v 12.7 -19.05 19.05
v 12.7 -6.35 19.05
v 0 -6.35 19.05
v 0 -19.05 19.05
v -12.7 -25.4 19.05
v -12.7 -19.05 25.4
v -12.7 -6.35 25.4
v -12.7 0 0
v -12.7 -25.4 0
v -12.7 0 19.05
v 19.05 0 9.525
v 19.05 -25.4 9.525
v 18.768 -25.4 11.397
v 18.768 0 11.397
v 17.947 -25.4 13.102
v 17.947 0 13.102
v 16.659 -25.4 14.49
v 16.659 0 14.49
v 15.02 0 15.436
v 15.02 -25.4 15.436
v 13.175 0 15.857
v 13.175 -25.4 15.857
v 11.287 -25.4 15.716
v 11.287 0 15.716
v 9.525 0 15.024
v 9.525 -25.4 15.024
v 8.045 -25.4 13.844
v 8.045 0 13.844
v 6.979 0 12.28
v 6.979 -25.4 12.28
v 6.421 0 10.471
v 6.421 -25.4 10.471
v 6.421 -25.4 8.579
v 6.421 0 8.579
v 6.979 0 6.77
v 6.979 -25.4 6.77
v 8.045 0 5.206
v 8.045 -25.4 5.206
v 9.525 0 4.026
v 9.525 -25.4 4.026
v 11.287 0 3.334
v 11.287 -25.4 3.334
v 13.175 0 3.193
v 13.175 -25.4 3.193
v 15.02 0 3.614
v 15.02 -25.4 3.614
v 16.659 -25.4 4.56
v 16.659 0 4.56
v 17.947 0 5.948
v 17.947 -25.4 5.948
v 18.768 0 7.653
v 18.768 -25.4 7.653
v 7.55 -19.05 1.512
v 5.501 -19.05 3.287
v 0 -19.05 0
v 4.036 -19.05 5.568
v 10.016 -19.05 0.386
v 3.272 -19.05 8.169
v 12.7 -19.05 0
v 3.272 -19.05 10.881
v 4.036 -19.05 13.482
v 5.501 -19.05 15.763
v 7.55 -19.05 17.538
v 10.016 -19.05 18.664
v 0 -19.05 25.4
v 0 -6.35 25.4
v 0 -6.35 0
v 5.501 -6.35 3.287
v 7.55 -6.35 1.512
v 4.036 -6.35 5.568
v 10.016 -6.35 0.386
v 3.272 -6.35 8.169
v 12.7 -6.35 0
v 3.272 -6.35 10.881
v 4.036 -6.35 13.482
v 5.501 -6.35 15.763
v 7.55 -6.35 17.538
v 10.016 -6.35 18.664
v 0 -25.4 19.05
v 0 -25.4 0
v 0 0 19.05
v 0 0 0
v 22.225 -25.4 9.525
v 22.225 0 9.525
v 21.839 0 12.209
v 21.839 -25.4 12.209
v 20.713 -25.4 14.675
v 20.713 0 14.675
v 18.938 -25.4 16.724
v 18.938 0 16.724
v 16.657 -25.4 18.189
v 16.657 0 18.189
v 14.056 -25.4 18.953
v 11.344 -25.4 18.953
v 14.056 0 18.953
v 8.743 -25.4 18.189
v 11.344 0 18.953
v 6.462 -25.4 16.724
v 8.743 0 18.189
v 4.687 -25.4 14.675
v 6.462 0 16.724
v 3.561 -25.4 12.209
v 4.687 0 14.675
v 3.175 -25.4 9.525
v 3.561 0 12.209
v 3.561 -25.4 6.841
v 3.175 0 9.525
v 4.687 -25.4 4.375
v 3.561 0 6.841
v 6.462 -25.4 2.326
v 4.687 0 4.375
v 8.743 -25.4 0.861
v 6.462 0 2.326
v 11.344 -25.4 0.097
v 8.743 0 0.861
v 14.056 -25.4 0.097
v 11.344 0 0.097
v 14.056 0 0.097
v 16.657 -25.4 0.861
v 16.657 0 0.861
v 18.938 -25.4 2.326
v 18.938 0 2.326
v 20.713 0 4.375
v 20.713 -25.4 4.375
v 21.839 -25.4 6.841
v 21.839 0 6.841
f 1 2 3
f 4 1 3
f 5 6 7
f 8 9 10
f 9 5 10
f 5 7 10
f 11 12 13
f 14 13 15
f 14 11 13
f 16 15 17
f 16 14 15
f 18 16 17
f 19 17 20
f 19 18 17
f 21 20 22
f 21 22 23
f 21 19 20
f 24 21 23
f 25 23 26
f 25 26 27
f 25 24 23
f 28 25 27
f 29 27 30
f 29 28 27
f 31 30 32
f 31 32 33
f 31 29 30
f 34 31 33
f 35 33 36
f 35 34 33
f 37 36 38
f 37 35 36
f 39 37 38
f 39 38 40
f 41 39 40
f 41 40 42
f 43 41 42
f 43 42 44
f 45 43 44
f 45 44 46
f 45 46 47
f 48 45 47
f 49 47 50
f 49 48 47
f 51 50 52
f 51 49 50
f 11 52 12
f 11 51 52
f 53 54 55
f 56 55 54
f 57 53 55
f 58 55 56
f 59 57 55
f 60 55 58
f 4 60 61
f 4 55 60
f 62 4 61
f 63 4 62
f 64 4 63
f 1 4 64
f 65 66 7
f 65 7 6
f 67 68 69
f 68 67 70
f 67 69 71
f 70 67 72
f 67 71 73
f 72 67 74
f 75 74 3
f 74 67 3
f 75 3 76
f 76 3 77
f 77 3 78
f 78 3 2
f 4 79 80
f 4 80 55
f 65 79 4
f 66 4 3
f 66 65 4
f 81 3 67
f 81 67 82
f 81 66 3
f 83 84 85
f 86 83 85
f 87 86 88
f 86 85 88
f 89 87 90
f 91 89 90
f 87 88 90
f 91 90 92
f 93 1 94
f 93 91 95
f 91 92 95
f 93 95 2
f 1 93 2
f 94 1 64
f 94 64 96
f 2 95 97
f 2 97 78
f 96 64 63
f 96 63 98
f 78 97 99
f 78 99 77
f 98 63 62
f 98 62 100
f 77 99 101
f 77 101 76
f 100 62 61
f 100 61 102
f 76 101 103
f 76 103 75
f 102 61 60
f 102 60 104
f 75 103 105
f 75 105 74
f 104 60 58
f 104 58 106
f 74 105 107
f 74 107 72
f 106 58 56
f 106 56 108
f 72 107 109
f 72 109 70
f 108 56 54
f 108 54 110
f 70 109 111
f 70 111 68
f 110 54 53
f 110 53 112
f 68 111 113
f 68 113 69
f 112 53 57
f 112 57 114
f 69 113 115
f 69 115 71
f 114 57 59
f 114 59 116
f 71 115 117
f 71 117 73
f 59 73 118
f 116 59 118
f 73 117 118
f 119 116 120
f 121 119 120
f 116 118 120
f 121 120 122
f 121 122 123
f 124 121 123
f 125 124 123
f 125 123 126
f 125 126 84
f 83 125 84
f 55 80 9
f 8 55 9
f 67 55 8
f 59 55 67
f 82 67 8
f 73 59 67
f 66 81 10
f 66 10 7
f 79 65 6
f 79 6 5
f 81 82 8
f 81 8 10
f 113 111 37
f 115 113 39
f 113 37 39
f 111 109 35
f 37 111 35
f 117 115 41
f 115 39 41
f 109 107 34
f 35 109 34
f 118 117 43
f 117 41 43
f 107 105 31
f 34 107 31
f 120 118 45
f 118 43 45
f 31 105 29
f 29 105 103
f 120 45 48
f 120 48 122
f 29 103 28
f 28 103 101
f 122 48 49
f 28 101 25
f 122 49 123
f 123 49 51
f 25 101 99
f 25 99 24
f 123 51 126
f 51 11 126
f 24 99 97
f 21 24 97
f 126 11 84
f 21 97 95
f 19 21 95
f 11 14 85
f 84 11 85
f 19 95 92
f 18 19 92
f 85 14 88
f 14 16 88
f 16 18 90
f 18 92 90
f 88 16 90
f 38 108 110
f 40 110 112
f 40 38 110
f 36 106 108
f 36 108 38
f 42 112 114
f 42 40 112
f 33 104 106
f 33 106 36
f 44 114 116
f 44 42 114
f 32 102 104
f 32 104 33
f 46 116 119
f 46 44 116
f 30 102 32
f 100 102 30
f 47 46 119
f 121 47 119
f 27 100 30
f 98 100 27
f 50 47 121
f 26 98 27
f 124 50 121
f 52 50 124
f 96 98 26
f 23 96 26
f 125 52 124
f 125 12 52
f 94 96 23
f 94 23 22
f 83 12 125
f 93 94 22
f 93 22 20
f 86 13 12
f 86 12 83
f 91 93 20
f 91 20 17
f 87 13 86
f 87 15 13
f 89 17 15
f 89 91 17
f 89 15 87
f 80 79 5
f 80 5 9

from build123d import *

# Parameters (mm, degrees)
F1_DEPTH = 12.7
F3_START = 6.35
F3_DEPTH = 12.7
F4_R     = 9.525
F4_R_2   = 6.35
F5_DEPTH = 25.4


with BuildPart() as f1:
    # F0 (on Right) → F1 (new body)
    with BuildSketch(Plane.YZ):
        Polygon((-25.4, 0), (0, 0), (0, 19.05), (-6.35, 25.4), (-19.05, 25.4), (-25.4, 19.05), align=None)
    extrude(amount=-F1_DEPTH)

    # F2 (on Front) → F3 (join)
    with BuildSketch(Plane.XZ.offset(F3_START)):
        with BuildLine():
            Line((0, 19.05), (0, 0))
            Line((0, 0), (12.7, 0))
            ThreePointArc((12.7, 0), (3.175, 9.525), (12.7, 19.05))
            Line((12.7, 19.05), (0, 19.05))
        make_face()
    extrude(amount=F3_DEPTH)

    # F4 (on Front) → F5 (join)
    with BuildSketch(Plane.XZ):
        with Locations((12.7, 9.525)):
            Circle(F4_R)
        with Locations((12.7, 9.525)):
            Circle(F4_R_2, mode=Mode.SUBTRACT)
    extrude(amount=F5_DEPTH)


solid = f1.part
